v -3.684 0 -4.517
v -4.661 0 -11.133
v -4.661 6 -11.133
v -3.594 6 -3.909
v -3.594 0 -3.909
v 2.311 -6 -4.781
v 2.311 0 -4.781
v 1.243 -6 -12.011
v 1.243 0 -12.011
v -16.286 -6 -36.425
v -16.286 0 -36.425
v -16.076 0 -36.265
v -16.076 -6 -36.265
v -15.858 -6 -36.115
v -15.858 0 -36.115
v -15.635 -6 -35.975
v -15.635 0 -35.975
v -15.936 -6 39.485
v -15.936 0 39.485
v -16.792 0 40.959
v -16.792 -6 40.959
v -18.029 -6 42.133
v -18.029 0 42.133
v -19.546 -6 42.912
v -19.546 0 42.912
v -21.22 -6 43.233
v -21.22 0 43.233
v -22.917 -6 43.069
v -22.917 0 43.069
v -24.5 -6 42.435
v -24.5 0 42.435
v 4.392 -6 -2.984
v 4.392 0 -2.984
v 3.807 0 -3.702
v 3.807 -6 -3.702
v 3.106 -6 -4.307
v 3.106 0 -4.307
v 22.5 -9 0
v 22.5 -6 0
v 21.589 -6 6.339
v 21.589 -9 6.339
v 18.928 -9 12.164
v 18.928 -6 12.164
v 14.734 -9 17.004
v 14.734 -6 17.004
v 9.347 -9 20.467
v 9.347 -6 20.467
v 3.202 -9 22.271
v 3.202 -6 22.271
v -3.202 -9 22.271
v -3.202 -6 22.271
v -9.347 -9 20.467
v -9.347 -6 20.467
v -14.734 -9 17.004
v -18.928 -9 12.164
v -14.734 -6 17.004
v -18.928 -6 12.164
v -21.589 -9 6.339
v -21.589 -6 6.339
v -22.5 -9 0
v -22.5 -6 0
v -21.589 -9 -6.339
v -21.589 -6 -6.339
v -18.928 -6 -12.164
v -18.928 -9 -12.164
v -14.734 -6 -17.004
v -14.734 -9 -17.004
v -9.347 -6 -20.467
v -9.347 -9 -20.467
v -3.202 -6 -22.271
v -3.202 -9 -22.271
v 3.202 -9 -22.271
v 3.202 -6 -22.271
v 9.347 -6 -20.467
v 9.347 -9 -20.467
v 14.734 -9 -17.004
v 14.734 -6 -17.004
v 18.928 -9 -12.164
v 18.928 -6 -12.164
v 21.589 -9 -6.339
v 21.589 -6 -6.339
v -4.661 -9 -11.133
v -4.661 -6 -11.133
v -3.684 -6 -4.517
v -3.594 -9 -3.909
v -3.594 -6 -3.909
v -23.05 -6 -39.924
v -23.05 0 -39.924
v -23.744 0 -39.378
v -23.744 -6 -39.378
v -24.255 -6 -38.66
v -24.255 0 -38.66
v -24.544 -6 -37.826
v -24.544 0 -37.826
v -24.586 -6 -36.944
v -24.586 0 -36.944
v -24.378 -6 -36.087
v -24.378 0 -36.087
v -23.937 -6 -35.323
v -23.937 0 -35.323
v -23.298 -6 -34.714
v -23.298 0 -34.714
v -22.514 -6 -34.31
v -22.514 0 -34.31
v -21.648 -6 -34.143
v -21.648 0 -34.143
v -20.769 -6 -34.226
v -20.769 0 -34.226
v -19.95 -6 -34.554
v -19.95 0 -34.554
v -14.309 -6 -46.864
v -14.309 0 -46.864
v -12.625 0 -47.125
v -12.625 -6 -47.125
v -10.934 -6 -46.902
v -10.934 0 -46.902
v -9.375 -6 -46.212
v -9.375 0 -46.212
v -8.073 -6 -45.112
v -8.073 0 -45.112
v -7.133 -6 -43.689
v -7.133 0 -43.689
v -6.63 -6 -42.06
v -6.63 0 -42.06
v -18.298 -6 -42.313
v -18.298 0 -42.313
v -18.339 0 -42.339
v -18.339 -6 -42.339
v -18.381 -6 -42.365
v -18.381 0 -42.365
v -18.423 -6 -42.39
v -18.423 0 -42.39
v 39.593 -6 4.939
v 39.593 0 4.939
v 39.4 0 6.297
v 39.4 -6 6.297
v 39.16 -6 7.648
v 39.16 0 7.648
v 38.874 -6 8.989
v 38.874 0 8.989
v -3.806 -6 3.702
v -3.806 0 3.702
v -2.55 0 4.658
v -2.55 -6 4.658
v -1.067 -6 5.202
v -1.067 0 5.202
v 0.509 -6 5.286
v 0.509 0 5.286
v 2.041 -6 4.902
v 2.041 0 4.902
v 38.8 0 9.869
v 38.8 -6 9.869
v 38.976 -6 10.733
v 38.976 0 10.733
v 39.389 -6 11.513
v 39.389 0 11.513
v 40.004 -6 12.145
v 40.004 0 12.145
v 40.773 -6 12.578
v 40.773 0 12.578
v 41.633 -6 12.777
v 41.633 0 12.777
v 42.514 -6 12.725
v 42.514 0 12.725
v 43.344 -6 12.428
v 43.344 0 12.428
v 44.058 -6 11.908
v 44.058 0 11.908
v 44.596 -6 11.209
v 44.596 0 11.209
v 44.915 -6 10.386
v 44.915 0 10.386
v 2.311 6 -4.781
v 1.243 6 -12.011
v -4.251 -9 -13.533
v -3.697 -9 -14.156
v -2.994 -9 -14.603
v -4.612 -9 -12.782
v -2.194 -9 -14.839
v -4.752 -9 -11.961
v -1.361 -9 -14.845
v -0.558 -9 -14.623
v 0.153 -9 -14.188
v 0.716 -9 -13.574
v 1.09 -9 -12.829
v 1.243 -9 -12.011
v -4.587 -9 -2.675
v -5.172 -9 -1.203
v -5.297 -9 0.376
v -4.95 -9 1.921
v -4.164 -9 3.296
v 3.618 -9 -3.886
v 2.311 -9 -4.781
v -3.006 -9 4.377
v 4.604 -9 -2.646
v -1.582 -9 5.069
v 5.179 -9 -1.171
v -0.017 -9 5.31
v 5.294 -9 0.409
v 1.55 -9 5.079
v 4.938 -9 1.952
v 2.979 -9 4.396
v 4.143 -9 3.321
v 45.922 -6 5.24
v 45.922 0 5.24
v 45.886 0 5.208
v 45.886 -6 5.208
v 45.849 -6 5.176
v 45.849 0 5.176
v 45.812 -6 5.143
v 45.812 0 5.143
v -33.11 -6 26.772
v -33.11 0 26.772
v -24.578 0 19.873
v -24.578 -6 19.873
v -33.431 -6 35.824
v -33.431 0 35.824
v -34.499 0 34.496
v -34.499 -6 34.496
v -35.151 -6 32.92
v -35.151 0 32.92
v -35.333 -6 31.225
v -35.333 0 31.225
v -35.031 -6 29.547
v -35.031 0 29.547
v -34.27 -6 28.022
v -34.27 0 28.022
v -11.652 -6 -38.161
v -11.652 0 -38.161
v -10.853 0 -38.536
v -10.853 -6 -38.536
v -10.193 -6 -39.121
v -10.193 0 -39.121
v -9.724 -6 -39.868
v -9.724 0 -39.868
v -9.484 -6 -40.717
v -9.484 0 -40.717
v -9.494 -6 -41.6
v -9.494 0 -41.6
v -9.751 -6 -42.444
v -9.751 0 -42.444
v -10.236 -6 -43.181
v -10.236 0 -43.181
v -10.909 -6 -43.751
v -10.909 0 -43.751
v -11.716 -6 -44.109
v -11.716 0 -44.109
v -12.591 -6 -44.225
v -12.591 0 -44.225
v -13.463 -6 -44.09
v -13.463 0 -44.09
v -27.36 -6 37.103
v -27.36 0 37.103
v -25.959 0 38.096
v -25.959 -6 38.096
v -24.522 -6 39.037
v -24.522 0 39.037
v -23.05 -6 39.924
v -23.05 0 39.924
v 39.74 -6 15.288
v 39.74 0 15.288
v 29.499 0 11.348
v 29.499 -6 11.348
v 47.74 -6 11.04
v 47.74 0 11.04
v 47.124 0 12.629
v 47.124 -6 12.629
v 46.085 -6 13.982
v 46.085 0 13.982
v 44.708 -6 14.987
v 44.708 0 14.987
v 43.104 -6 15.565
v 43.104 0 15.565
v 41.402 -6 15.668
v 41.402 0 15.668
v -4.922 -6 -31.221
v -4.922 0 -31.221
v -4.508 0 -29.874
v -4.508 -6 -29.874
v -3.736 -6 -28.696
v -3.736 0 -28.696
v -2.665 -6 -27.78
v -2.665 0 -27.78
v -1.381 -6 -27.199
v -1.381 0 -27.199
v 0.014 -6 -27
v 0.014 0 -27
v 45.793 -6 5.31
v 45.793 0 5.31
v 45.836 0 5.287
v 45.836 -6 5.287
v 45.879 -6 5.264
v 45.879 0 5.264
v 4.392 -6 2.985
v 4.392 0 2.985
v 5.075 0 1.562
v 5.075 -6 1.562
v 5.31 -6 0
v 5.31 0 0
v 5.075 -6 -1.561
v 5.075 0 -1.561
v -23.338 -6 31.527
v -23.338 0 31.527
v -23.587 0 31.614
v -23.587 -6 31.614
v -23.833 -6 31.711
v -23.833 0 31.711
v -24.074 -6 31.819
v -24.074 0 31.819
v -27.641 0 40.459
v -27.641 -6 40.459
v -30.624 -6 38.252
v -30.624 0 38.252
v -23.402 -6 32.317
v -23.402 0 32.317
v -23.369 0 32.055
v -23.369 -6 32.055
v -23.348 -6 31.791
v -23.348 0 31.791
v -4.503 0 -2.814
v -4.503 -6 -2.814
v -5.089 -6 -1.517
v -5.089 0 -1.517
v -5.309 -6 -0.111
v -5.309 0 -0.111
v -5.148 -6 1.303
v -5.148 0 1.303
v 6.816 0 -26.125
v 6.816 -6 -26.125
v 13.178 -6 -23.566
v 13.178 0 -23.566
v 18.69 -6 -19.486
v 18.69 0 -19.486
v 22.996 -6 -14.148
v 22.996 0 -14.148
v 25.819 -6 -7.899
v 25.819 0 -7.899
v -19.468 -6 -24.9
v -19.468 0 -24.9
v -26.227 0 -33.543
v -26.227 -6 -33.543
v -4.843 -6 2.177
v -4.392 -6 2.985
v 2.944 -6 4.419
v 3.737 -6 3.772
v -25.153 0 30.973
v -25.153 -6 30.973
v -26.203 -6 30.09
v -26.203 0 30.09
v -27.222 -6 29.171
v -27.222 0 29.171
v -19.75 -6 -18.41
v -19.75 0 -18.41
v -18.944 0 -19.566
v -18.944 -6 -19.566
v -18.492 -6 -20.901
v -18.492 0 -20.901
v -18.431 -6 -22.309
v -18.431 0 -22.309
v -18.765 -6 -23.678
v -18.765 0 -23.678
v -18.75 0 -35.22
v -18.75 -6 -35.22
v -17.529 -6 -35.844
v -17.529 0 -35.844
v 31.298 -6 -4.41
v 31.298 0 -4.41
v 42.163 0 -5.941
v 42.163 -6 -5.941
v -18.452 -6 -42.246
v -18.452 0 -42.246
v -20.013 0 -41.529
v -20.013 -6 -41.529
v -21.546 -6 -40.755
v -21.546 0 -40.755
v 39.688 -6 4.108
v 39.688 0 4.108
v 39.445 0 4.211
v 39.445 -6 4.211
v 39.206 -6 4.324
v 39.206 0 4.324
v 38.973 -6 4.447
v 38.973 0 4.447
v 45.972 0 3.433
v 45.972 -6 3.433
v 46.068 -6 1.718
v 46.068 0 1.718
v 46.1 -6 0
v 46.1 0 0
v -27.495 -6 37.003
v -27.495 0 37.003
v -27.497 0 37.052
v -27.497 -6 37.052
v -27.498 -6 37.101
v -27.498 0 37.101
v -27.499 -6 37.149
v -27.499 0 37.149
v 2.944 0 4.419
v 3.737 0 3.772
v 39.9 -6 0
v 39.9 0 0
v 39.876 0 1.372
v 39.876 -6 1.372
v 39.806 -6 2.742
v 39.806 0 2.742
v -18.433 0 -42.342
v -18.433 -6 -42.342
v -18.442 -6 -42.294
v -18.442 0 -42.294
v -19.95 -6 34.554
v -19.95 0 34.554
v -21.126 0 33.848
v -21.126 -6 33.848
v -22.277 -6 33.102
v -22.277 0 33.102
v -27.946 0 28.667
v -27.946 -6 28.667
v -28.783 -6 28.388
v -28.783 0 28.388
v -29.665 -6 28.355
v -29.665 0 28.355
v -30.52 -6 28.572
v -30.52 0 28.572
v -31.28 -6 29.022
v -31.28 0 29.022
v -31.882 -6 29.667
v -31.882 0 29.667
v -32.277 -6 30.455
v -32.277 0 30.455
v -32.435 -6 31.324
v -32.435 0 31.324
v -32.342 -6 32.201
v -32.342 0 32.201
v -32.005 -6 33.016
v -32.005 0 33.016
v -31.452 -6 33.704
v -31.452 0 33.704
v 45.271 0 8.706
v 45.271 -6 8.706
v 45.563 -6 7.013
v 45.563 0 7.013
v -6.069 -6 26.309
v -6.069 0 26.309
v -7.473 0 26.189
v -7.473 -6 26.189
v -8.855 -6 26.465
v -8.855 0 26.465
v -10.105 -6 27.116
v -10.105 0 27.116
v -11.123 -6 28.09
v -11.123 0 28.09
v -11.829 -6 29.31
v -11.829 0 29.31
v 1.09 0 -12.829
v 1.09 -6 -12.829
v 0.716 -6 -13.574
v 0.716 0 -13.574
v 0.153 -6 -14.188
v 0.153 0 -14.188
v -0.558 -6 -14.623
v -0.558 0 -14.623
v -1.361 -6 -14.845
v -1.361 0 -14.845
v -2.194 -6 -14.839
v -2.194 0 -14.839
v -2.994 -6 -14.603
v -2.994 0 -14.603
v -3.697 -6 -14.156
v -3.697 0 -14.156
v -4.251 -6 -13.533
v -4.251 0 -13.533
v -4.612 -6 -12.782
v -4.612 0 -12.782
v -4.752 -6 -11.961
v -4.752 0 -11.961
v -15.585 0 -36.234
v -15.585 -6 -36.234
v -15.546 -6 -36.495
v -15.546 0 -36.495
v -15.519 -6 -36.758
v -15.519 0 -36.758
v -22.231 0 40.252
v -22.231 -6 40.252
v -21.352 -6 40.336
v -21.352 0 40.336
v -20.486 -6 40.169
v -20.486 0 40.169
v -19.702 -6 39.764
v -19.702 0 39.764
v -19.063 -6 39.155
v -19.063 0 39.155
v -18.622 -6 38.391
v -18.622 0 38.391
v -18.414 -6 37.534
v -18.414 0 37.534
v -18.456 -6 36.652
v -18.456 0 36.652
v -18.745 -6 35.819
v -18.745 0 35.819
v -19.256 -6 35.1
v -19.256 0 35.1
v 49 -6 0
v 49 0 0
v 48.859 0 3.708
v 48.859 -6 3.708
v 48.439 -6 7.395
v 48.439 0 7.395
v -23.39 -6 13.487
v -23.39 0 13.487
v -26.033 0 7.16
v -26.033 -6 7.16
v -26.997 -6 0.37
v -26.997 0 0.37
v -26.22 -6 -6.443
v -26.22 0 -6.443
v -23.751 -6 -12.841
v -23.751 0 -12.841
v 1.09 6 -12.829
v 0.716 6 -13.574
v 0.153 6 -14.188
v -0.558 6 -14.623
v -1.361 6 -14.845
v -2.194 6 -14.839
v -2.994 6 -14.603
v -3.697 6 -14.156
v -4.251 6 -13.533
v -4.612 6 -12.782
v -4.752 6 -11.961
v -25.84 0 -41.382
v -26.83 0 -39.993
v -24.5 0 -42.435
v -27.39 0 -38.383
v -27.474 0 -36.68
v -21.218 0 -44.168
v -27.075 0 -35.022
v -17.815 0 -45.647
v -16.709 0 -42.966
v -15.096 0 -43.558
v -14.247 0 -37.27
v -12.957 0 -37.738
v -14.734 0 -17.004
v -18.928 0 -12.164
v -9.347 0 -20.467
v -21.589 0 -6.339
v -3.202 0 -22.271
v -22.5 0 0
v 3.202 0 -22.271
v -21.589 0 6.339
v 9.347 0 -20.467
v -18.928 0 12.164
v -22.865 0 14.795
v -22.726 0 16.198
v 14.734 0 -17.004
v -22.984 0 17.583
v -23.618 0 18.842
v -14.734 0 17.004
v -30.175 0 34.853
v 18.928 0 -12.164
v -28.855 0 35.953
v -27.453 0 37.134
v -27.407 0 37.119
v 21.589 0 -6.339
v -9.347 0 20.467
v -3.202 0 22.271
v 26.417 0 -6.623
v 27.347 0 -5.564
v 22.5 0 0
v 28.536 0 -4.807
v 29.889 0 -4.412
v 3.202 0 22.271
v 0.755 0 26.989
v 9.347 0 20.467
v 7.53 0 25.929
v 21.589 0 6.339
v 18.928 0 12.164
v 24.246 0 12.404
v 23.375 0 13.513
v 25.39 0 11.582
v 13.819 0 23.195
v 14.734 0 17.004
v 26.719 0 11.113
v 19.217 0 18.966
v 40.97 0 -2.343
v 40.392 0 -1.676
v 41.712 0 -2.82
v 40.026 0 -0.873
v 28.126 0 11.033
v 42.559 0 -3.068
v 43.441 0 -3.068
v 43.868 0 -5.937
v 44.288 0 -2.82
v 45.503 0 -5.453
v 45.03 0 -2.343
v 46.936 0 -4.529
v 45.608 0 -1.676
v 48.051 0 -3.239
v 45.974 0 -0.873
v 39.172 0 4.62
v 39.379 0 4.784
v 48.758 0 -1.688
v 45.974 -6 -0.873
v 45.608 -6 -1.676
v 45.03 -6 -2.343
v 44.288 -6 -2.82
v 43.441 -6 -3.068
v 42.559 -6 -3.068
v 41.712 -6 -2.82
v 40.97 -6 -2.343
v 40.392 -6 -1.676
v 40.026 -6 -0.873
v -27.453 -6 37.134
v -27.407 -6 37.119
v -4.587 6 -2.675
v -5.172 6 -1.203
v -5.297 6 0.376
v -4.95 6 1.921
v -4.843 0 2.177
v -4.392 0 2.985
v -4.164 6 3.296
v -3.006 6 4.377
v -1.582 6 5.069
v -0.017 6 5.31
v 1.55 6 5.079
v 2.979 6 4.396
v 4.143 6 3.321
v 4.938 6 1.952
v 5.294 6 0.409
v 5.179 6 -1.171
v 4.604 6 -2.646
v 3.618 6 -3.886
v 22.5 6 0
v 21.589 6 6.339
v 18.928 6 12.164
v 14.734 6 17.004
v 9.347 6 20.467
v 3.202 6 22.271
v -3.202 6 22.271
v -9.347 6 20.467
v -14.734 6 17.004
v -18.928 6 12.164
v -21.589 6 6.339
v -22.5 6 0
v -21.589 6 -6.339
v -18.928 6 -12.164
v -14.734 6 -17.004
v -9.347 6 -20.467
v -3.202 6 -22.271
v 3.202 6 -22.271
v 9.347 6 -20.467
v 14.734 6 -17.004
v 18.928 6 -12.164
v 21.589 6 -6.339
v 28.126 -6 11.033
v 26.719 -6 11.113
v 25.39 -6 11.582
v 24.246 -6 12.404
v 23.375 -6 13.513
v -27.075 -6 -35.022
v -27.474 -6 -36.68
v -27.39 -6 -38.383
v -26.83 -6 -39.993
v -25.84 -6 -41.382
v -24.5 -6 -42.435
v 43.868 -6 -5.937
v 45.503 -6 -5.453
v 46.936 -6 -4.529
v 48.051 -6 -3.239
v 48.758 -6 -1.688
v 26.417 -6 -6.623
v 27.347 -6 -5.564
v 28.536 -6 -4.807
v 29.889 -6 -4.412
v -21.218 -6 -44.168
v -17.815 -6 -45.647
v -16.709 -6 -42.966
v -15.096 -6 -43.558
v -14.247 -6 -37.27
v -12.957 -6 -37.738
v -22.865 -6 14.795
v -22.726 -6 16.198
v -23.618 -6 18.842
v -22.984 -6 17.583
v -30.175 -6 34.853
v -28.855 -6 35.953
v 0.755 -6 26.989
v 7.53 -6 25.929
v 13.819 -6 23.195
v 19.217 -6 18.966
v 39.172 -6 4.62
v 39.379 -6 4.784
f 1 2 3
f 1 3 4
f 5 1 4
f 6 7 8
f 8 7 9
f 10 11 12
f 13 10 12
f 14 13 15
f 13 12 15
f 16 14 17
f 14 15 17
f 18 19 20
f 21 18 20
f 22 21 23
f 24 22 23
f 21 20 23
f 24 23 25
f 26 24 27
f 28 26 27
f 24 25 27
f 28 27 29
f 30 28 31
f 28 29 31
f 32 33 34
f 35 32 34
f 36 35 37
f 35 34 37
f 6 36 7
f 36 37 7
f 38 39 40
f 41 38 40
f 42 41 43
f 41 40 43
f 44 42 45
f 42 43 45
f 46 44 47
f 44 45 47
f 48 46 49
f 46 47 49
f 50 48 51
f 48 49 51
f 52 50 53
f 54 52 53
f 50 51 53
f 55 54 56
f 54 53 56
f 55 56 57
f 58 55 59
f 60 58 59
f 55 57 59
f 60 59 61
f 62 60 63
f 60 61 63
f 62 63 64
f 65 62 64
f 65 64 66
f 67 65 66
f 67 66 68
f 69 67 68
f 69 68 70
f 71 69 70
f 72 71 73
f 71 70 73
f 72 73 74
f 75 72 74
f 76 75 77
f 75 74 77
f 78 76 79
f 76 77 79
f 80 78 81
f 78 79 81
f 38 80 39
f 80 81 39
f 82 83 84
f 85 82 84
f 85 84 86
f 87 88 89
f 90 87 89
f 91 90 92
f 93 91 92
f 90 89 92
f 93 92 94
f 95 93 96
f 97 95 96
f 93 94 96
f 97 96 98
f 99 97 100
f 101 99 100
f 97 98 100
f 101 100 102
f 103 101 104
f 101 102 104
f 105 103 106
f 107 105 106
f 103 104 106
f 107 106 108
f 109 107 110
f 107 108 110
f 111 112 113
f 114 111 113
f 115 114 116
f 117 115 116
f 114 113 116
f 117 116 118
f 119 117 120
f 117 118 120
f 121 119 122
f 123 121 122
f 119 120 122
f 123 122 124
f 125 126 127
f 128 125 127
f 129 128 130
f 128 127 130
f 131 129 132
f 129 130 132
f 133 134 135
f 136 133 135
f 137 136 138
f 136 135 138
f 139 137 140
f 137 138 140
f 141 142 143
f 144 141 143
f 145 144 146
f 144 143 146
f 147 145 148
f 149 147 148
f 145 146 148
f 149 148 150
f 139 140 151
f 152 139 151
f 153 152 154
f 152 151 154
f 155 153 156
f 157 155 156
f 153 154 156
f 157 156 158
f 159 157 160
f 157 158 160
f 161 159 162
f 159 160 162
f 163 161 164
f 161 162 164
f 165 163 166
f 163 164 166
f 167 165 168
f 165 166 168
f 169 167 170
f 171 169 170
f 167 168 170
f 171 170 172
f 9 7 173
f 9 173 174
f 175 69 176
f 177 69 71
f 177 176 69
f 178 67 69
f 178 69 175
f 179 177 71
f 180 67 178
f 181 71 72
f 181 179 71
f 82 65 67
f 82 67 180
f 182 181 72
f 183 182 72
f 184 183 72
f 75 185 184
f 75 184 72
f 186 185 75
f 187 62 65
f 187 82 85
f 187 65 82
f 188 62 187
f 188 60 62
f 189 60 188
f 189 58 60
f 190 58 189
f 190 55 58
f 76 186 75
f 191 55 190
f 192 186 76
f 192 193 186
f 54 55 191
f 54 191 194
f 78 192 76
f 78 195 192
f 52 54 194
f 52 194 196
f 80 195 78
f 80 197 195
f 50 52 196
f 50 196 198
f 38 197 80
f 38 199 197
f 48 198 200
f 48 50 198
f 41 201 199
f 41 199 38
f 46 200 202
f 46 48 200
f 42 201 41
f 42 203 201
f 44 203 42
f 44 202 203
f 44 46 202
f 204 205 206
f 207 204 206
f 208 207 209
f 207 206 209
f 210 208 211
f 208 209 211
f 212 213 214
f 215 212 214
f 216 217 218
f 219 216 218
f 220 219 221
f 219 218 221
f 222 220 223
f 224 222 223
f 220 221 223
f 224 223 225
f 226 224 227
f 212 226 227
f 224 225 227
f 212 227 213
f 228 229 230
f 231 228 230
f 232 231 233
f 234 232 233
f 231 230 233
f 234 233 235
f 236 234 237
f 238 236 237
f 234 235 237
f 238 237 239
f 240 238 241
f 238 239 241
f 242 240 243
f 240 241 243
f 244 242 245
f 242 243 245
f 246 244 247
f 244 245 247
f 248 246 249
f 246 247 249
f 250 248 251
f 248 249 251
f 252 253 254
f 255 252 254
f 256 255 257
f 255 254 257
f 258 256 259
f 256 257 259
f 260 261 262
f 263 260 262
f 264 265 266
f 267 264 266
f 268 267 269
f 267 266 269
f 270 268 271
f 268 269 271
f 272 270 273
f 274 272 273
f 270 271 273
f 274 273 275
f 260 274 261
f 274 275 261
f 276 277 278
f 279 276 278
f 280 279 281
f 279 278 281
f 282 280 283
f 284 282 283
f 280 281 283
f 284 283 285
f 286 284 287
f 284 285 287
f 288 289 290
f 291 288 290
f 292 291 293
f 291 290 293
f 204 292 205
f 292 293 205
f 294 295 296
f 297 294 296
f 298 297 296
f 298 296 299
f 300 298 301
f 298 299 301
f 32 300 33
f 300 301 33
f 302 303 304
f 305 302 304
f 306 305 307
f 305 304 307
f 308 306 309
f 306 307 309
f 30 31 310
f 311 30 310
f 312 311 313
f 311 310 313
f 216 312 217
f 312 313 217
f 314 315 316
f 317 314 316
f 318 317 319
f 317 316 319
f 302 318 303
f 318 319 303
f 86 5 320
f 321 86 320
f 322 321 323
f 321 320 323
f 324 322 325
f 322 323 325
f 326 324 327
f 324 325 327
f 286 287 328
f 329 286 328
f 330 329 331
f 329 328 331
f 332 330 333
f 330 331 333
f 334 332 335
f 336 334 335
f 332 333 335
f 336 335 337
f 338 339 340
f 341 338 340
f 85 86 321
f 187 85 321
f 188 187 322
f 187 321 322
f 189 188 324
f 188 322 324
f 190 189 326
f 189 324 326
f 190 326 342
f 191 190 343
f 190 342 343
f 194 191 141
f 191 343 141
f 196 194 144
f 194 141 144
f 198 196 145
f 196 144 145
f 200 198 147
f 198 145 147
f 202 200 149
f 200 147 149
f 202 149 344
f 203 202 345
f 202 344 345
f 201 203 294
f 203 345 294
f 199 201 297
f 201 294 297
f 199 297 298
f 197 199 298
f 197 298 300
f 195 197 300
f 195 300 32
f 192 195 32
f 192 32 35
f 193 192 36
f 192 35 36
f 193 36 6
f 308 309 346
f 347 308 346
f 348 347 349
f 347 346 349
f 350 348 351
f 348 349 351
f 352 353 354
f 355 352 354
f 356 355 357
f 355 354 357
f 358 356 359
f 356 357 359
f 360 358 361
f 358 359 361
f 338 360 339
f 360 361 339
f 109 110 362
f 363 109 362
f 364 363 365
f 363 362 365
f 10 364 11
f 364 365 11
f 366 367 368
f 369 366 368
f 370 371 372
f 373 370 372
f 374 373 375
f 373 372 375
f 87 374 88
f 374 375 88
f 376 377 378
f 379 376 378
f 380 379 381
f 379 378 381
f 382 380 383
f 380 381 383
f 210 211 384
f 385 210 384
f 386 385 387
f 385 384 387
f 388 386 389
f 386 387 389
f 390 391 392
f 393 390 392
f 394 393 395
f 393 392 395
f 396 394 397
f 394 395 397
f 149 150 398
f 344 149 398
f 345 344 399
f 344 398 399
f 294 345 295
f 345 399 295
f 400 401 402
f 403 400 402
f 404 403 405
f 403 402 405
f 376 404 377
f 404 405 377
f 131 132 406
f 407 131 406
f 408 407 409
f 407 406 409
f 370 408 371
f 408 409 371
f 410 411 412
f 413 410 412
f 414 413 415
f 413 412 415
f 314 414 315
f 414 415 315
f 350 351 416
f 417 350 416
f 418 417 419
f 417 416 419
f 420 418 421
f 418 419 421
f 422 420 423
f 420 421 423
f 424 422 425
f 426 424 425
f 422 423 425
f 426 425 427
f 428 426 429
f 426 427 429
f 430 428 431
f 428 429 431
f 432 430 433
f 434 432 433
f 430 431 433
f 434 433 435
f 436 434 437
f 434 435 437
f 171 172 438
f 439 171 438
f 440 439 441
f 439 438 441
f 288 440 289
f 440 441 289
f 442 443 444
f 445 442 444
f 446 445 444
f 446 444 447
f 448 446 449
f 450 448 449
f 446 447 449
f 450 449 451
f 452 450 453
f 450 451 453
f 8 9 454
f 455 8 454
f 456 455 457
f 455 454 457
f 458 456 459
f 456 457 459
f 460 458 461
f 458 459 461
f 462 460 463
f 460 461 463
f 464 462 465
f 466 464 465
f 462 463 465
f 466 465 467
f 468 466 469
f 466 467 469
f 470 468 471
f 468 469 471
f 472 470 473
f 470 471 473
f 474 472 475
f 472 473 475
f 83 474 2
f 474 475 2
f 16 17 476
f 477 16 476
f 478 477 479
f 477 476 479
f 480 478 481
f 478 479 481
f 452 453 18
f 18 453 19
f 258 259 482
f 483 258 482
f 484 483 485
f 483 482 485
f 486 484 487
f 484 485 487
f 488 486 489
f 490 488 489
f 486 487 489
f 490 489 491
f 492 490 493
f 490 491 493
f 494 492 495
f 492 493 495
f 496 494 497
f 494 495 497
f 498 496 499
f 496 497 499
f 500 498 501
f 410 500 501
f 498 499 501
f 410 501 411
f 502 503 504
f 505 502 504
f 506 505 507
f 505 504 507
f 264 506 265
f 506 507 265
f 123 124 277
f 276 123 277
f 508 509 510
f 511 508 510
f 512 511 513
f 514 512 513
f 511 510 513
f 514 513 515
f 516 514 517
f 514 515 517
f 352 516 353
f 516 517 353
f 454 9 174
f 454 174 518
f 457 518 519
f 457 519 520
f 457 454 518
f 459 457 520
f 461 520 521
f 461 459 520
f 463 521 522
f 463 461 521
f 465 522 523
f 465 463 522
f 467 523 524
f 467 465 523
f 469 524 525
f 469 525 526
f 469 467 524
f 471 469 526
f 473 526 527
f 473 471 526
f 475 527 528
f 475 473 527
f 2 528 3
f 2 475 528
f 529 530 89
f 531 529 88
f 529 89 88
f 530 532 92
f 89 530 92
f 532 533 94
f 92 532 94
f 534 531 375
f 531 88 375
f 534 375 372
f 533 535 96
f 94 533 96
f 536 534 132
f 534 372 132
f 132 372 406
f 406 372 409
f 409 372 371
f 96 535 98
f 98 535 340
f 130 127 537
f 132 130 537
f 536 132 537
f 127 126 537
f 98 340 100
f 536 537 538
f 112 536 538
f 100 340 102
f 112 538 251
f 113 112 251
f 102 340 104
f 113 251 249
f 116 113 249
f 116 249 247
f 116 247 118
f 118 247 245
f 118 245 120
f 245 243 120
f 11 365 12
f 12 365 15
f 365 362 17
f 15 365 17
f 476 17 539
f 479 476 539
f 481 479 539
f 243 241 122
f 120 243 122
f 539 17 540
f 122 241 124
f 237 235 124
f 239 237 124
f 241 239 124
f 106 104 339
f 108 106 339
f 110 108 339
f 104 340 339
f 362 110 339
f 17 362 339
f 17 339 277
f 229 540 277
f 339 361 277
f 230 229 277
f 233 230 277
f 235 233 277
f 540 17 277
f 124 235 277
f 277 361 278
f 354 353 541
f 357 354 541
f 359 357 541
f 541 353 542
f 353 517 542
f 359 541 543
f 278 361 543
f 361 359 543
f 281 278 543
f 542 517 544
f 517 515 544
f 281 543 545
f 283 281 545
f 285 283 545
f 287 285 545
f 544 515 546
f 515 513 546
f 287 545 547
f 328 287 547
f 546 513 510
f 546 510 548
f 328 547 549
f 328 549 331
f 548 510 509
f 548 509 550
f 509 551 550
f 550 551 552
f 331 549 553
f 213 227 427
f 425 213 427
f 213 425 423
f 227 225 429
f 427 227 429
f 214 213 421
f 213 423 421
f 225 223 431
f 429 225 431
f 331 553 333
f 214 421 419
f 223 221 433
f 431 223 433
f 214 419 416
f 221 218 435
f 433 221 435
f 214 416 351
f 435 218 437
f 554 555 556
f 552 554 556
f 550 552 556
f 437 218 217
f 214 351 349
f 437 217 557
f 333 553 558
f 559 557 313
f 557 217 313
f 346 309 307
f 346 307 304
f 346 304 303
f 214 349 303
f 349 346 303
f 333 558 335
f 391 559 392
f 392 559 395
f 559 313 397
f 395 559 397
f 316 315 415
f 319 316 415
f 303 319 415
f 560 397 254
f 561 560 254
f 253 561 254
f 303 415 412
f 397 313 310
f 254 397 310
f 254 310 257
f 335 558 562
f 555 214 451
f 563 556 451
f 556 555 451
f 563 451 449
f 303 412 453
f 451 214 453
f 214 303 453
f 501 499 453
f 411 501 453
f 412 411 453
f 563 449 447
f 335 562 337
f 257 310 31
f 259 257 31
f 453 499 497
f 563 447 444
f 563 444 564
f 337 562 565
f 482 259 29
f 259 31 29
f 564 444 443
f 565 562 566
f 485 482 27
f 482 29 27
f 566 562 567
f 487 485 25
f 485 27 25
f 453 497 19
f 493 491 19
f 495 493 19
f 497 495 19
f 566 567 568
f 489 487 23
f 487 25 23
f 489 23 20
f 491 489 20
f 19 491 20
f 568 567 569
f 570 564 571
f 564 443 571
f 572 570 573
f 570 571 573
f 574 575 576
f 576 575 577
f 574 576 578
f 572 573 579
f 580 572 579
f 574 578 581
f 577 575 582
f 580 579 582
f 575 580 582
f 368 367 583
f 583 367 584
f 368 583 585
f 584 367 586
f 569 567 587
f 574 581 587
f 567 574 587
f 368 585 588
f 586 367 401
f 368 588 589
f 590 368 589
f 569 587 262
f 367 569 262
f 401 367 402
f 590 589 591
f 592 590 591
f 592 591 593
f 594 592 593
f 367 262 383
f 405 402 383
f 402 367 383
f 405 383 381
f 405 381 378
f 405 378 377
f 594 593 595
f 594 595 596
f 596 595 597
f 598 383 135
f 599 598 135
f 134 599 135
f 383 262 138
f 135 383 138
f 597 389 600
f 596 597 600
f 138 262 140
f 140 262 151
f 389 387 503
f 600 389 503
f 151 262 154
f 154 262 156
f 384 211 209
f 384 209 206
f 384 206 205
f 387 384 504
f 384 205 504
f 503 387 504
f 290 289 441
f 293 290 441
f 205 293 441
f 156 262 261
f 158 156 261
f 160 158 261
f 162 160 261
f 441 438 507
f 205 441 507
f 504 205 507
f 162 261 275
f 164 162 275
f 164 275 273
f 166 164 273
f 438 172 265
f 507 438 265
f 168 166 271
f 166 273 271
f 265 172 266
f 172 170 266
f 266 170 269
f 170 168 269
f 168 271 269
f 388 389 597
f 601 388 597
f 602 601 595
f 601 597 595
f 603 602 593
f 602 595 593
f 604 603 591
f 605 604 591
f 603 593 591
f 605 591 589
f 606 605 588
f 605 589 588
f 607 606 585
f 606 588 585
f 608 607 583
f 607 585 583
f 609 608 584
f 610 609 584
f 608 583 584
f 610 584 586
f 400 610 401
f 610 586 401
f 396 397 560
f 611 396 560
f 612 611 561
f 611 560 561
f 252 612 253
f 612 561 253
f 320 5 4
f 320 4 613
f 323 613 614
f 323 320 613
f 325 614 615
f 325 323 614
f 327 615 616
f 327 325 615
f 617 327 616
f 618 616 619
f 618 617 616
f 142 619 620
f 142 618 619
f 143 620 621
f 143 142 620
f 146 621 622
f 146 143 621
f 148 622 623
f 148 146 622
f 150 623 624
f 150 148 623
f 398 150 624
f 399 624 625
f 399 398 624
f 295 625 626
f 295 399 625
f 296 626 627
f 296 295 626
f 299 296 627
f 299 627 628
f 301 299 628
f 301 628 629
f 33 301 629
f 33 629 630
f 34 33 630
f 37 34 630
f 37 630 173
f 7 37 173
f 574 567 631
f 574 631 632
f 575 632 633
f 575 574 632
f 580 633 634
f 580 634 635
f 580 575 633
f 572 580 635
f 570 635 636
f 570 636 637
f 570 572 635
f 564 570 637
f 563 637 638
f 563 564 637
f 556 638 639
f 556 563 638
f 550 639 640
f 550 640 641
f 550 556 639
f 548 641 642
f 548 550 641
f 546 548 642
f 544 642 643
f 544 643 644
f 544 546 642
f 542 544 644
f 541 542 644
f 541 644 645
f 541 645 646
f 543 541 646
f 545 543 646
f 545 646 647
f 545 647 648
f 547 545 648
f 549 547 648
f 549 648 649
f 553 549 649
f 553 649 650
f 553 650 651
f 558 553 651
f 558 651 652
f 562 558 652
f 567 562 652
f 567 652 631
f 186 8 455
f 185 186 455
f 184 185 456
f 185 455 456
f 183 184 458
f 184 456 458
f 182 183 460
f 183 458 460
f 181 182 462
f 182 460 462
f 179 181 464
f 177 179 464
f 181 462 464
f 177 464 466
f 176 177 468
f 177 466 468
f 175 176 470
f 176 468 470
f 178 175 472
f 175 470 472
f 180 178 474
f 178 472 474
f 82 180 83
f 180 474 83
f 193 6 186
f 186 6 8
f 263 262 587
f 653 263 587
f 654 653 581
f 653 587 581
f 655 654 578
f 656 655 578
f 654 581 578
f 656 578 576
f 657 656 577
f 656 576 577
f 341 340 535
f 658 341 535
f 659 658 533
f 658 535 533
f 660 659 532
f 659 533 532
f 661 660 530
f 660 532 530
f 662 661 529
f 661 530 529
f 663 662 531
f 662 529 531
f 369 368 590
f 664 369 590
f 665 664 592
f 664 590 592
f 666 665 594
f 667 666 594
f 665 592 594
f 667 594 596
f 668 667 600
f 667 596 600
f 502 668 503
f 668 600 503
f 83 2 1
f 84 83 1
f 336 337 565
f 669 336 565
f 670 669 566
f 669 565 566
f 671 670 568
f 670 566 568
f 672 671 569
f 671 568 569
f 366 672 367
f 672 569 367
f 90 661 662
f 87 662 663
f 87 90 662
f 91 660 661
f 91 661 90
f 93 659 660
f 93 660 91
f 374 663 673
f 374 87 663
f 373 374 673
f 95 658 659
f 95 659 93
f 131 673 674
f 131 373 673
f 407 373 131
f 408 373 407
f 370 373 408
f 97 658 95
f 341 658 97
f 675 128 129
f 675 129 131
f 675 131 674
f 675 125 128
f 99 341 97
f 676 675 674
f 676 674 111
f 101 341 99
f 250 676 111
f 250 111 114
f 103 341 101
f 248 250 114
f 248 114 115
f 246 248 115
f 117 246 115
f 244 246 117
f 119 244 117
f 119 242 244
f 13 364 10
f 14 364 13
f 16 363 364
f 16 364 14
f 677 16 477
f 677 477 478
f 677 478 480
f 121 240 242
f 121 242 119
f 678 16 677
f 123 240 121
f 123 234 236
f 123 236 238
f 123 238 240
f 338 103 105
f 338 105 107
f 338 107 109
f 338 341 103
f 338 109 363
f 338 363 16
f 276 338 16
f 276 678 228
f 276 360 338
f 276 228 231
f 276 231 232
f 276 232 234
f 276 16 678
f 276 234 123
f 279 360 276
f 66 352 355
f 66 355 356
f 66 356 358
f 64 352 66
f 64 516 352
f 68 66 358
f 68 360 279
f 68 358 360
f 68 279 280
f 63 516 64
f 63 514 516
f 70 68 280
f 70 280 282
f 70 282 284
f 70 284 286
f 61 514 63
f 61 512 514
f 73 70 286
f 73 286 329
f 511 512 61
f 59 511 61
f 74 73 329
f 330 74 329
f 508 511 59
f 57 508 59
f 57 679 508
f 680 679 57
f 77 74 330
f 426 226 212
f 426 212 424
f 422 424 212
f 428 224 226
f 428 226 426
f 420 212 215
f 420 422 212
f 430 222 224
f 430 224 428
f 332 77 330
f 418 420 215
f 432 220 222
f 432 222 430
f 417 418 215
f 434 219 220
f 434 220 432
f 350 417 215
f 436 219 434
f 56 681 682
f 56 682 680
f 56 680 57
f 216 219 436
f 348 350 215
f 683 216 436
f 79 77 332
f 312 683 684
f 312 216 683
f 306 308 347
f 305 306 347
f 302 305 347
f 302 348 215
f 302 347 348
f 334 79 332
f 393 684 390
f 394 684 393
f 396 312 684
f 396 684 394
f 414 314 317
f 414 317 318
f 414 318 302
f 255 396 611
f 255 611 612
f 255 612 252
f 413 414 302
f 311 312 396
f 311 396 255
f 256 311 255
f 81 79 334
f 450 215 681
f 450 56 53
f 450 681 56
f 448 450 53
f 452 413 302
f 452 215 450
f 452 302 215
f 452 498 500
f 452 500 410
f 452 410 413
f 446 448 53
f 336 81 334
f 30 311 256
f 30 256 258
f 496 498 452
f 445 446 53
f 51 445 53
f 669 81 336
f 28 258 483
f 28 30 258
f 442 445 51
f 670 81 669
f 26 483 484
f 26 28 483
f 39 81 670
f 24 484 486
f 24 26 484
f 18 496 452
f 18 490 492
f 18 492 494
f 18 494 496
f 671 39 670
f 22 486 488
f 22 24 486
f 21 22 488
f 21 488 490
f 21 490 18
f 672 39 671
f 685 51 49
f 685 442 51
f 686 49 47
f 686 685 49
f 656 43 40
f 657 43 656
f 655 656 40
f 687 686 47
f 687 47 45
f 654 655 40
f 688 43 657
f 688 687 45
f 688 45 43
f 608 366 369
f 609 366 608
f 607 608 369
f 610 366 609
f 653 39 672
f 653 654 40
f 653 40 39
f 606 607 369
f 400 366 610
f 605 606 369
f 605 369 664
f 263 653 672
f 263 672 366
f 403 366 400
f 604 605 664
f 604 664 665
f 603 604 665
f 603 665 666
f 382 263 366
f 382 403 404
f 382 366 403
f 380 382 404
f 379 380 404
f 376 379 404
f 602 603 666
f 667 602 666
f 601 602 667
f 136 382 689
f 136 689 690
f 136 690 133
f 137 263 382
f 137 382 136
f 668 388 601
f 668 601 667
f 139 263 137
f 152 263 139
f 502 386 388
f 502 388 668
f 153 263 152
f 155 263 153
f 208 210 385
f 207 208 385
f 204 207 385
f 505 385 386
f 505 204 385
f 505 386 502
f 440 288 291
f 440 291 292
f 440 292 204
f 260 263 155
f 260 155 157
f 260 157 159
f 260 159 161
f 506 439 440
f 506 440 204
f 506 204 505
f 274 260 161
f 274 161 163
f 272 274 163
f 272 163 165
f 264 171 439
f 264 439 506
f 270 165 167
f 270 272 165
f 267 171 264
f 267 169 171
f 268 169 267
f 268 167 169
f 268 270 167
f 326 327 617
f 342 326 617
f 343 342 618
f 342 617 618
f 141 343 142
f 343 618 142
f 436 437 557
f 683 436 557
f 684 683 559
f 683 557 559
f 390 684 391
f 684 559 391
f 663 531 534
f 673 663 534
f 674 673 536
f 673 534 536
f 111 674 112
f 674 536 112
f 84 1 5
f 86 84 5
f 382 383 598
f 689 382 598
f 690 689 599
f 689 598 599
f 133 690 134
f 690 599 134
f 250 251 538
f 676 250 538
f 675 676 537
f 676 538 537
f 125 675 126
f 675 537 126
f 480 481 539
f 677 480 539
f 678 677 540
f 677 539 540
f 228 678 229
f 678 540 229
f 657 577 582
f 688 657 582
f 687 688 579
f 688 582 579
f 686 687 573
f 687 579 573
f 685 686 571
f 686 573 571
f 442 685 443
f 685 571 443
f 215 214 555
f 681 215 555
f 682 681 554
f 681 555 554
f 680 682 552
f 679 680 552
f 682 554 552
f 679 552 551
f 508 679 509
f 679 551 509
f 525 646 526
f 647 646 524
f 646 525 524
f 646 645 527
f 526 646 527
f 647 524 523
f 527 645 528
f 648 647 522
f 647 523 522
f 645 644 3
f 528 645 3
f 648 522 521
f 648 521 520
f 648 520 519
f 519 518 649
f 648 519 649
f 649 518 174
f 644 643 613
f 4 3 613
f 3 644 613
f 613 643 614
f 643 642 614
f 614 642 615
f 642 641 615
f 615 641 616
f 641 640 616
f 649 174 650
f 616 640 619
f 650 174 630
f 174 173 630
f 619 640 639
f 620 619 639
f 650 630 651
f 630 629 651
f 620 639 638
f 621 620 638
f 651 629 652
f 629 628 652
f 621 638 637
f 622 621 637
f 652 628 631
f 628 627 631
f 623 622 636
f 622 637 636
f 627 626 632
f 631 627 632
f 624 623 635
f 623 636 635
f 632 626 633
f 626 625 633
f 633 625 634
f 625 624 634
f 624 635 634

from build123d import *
from build123d import SkipClean  # not in build123d's __all__

# Parameters (mm, degrees)
F1_DEPTH      = 6
F2_R          = 22.5
F3_DEPTH      = 3
F3_DEPTH_BACK = 12


with BuildPart() as f1:
    # F0 (on Front) → F1 (new body)
    with BuildSketch(Plane.XZ):
        with BuildLine():
            ThreePointArc((-15.9360760742, 39.4846993069), (-19.545554777, 42.911846885), (-24.5, 42.4352447854))
            ThreePointArc((-24.5, 42.4352447854), (-29.1533569815, 39.3837755518), (-33.430729205, 35.824381988))
            ThreePointArc((-33.430729205, 35.824381988), (-35.3334015022, 31.2250869161), (-33.1097213112, 26.7721189803))
            Line((-33.1097213112, 26.7721189803), (-24.5775940866, 19.8731444143))
            ThreePointArc((-24.5775940866, 19.8731444143), (-22.8056864044, 16.8994131973), (-23.3899197808, 13.487462795))
            ThreePointArc((-23.3899197808, 13.487462795), (-26.8258933187, -3.0612820274), (-19.7498381023, -18.410428972))
            ThreePointArc((-19.7498381023, -18.410428972), (-18.4119152904, -21.6030292813), (-19.4682866758, -24.8995143308))
            Line((-19.4682866758, -24.8995143308), (-26.2267146235, -33.5433963703))
            ThreePointArc((-26.2267146235, -33.5433963703), (-27.3899721372, -38.3828704105), (-24.5, -42.4352447854))
            ThreePointArc((-24.5, -42.4352447854), (-19.530671634, -44.9394355274), (-14.3094602739, -46.8640517526))
            ThreePointArc((-14.3094602739, -46.8640517526), (-9.3750177536, -46.212166761), (-6.6304744945, -42.0599192579))
            Line((-6.6304744945, -42.0599192579), (-4.9218508726, -31.2213930501))
            ThreePointArc((-4.9218508726, -31.2213930501), (-3.2324779357, -28.2000103756), (0.0144744773, -26.9999961202))
            ThreePointArc((0.0144744773, -26.9999961202), (16.0640946633, -21.7012640795), (25.8188182355, -7.8986470313))
            ThreePointArc((25.8188182355, -7.8986470313), (27.9147298015, -5.1436717332), (31.2977552903, -4.410273664))
            Line((31.2977552903, -4.410273664), (42.1627906977, -5.9413029366))
            ThreePointArc((42.1627906977, -5.9413029366), (46.9355269143, -4.5289764745), (49, 0))
            ThreePointArc((49, 0), (48.6840286155, 5.5556599757), (47.740189479, 11.0396697646))
            ThreePointArc((47.740189479, 11.0396697646), (44.7084192558, 14.987079845), (39.7401958057, 15.2878002776))
            Line((39.7401958057, 15.2878002776), (29.4994449592, 11.3482486357))
            ThreePointArc((29.4994449592, 11.3482486357), (26.0381643401, 11.3005971783), (23.3754453035, 13.5125333252))
            ThreePointArc((23.3754453035, 13.5125333252), (10.7617986555, 24.7625461069), (-6.0689801331, 26.3090760032))
            ThreePointArc((-6.0689801331, 26.3090760032), (-9.5028145111, 26.7467010144), (-11.8294686145, 29.3097879948))
            Line((-11.8294686145, 29.3097879948), (-15.9360760742, 39.4846993069))
        make_face()
        with BuildLine():
            ThreePointArc((-18.2977896407, -42.3131291004), (-18.3599561093, -42.3518337374), (-18.4225903326, -42.3897767579))
            ThreePointArc((-18.4225903326, -42.3897767579), (-18.4375826284, -42.3180972643), (-18.4516989687, -42.2462401305))
            ThreePointArc((-18.4516989687, -42.2462401305), (-20.7833159026, -41.1492865077), (-23.05, -39.9237711145))
            ThreePointArc((-23.05, -39.9237711145), (-24.1846787517, -35.6890923627), (-19.95, -34.554413611))
            ThreePointArc((-19.95, -34.554413611), (-18.1421434856, -35.5369192496), (-16.2860412235, -36.4249208821))
            ThreePointArc((-16.2860412235, -36.4249208821), (-15.9677964631, -36.1891617461), (-15.6346911323, -35.9749120408))
            ThreePointArc((-15.6346911323, -35.9749120408), (-15.5640668297, -36.3646225815), (-15.519307053, -36.7581434324))
            ThreePointArc((-15.519307053, -36.7581434324), (-13.6037364042, -37.5093102555), (-11.6519890802, -38.1607278557))
            ThreePointArc((-11.6519890802, -38.1607278557), (-9.5924128846, -42.0308888206), (-13.4625738495, -44.0904650162))
            ThreePointArc((-13.4625738495, -44.0904650162), (-15.9050276013, -43.2693898386), (-18.2977896407, -42.3131291004))
        make_face(mode=Mode.SUBTRACT)
        with BuildLine():
            ThreePointArc((2.0410607887, 4.9020578186), (3.3561252192, 4.1149147638), (4.3915942436, 2.9849623113))
            ThreePointArc((4.3915942436, 2.9849623113), (5.3099999882, 0.0003538209), (4.3919919982, -2.9843770351))
            ThreePointArc((4.3919919982, -2.9843770351), (3.4698827698, -4.0194543864), (2.3112879445, -4.7805907624))
            Line((2.3112879445, -4.7805907624), (1.2434795246, -12.010568624))
            ThreePointArc((1.2434795246, -12.010568624), (-2.1944705259, -14.838607263), (-4.6609590448, -11.1327015059))
            Line((-4.6609590448, -11.1327015059), (-3.6838317901, -4.5167128251))
            Line((-3.6838317901, -4.5167128251), (-3.5940513986, -3.9088226545))
            ThreePointArc((-3.5940513986, -3.9088226545), (-5.0887135619, -1.5169358209), (-5.1476659417, 1.3029333647))
            ThreePointArc((-5.1476659417, 1.3029333647), (-4.6350123617, 2.5908995362), (-3.8064652091, 3.7022861332))
            ThreePointArc((-3.8064652091, 3.7022861332), (-1.0672517117, 5.2016414509), (2.0410607887, 4.9020578186))
        make_face(mode=Mode.SUBTRACT)
        with BuildLine():
            ThreePointArc((-23.05, 39.9237711145), (-18.8153212483, 38.7890923627), (-19.95, 34.554413611))
            ThreePointArc((-19.95, 34.554413611), (-21.7048030996, 33.4800167624), (-23.401886203, 32.3165858677))
            ThreePointArc((-23.401886203, 32.3165858677), (-23.3568351823, 31.9230982526), (-23.3378421601, 31.5274957213))
            ThreePointArc((-23.3378421601, 31.5274957213), (-23.7106535397, 31.6611885515), (-24.0738324819, 31.8191858732))
            ThreePointArc((-24.0738324819, 31.8191858732), (-25.6821473576, 30.5358364402), (-27.2221652098, 29.1712824759))
            ThreePointArc((-27.2221652098, 29.1712824759), (-31.60361102, 29.322717652), (-31.4521758439, 33.7041634621))
            ThreePointArc((-31.4521758439, 33.7041634621), (-29.5198770058, 35.4088528699), (-27.4953498942, 37.0029152121))
            ThreePointArc((-27.4953498942, 37.0029152121), (-27.4977858588, 37.0761052717), (-27.4993283668, 37.1493196105))
            ThreePointArc((-27.4993283668, 37.1493196105), (-27.4297559565, 37.1264635728), (-27.3604676831, 37.1027601152))
            ThreePointArc((-27.3604676831, 37.1027601152), (-25.244669512, 38.5735228004), (-23.05, 39.9237711145))
        make_face(mode=Mode.SUBTRACT)
        with BuildLine():
            ThreePointArc((45.7931395349, 5.3102138882), (45.8577419681, 5.2757284657), (45.9219186994, 5.2404571474))
            ThreePointArc((45.9219186994, 5.2404571474), (45.8673385849, 5.1916336916), (45.8121666518, 5.1434800154))
            ThreePointArc((45.8121666518, 5.1434800154), (46.0279854146, 2.5757637074), (46.1, 0))
            ThreePointArc((46.1, 0), (43, -3.1), (39.9, 0))
            ThreePointArc((39.9, 0), (39.8469465851, 2.0569024872), (39.6879274265, 4.1083350144))
            ThreePointArc((39.6879274265, 4.1083350144), (39.3246316454, 4.2660634935), (38.9725332924, 4.4474163195))
            ThreePointArc((38.9725332924, 4.4474163195), (39.2747203695, 4.70343403), (39.5931395349, 4.9389575592))
            ThreePointArc((39.5931395349, 4.9389575592), (39.2858837618, 6.9734738153), (38.87415429, 8.9894453798))
            ThreePointArc((38.87415429, 8.9894453798), (41.1960239046, 12.7081711687), (44.9147496935, 10.3863015541))
            ThreePointArc((44.9147496935, 10.3863015541), (45.4249046071, 7.8605369687), (45.7931395349, 5.3102138882))
        make_face(mode=Mode.SUBTRACT)
    extrude(amount=F1_DEPTH)

    # F2 (on face) → F3 (join, two sides)
    with BuildSketch(Plane.XZ.offset(6)) as f3_sk:
        Circle(F2_R)
        with BuildLine():
            Line((-4.6609590448, -11.1327015059), (-3.5940513986, -3.9088226545))
            ThreePointArc((-3.5940513986, -3.9088226545), (0.7754775485, 5.2530690621), (2.3112879445, -4.7805907624))
            Line((2.3112879445, -4.7805907624), (1.2434795246, -12.010568624))
            ThreePointArc((1.2434795246, -12.010568624), (-2.1944705259, -14.838607263), (-4.6609590448, -11.1327015059))
        make_face(mode=Mode.SUBTRACT)
    with SkipClean():  # cleaning this boolean's faces spoils the solid; the shape is the same uncleaned
        extrude(amount=F3_DEPTH)
        extrude(f3_sk.sketch, amount=-F3_DEPTH_BACK)


solid = f1.part
